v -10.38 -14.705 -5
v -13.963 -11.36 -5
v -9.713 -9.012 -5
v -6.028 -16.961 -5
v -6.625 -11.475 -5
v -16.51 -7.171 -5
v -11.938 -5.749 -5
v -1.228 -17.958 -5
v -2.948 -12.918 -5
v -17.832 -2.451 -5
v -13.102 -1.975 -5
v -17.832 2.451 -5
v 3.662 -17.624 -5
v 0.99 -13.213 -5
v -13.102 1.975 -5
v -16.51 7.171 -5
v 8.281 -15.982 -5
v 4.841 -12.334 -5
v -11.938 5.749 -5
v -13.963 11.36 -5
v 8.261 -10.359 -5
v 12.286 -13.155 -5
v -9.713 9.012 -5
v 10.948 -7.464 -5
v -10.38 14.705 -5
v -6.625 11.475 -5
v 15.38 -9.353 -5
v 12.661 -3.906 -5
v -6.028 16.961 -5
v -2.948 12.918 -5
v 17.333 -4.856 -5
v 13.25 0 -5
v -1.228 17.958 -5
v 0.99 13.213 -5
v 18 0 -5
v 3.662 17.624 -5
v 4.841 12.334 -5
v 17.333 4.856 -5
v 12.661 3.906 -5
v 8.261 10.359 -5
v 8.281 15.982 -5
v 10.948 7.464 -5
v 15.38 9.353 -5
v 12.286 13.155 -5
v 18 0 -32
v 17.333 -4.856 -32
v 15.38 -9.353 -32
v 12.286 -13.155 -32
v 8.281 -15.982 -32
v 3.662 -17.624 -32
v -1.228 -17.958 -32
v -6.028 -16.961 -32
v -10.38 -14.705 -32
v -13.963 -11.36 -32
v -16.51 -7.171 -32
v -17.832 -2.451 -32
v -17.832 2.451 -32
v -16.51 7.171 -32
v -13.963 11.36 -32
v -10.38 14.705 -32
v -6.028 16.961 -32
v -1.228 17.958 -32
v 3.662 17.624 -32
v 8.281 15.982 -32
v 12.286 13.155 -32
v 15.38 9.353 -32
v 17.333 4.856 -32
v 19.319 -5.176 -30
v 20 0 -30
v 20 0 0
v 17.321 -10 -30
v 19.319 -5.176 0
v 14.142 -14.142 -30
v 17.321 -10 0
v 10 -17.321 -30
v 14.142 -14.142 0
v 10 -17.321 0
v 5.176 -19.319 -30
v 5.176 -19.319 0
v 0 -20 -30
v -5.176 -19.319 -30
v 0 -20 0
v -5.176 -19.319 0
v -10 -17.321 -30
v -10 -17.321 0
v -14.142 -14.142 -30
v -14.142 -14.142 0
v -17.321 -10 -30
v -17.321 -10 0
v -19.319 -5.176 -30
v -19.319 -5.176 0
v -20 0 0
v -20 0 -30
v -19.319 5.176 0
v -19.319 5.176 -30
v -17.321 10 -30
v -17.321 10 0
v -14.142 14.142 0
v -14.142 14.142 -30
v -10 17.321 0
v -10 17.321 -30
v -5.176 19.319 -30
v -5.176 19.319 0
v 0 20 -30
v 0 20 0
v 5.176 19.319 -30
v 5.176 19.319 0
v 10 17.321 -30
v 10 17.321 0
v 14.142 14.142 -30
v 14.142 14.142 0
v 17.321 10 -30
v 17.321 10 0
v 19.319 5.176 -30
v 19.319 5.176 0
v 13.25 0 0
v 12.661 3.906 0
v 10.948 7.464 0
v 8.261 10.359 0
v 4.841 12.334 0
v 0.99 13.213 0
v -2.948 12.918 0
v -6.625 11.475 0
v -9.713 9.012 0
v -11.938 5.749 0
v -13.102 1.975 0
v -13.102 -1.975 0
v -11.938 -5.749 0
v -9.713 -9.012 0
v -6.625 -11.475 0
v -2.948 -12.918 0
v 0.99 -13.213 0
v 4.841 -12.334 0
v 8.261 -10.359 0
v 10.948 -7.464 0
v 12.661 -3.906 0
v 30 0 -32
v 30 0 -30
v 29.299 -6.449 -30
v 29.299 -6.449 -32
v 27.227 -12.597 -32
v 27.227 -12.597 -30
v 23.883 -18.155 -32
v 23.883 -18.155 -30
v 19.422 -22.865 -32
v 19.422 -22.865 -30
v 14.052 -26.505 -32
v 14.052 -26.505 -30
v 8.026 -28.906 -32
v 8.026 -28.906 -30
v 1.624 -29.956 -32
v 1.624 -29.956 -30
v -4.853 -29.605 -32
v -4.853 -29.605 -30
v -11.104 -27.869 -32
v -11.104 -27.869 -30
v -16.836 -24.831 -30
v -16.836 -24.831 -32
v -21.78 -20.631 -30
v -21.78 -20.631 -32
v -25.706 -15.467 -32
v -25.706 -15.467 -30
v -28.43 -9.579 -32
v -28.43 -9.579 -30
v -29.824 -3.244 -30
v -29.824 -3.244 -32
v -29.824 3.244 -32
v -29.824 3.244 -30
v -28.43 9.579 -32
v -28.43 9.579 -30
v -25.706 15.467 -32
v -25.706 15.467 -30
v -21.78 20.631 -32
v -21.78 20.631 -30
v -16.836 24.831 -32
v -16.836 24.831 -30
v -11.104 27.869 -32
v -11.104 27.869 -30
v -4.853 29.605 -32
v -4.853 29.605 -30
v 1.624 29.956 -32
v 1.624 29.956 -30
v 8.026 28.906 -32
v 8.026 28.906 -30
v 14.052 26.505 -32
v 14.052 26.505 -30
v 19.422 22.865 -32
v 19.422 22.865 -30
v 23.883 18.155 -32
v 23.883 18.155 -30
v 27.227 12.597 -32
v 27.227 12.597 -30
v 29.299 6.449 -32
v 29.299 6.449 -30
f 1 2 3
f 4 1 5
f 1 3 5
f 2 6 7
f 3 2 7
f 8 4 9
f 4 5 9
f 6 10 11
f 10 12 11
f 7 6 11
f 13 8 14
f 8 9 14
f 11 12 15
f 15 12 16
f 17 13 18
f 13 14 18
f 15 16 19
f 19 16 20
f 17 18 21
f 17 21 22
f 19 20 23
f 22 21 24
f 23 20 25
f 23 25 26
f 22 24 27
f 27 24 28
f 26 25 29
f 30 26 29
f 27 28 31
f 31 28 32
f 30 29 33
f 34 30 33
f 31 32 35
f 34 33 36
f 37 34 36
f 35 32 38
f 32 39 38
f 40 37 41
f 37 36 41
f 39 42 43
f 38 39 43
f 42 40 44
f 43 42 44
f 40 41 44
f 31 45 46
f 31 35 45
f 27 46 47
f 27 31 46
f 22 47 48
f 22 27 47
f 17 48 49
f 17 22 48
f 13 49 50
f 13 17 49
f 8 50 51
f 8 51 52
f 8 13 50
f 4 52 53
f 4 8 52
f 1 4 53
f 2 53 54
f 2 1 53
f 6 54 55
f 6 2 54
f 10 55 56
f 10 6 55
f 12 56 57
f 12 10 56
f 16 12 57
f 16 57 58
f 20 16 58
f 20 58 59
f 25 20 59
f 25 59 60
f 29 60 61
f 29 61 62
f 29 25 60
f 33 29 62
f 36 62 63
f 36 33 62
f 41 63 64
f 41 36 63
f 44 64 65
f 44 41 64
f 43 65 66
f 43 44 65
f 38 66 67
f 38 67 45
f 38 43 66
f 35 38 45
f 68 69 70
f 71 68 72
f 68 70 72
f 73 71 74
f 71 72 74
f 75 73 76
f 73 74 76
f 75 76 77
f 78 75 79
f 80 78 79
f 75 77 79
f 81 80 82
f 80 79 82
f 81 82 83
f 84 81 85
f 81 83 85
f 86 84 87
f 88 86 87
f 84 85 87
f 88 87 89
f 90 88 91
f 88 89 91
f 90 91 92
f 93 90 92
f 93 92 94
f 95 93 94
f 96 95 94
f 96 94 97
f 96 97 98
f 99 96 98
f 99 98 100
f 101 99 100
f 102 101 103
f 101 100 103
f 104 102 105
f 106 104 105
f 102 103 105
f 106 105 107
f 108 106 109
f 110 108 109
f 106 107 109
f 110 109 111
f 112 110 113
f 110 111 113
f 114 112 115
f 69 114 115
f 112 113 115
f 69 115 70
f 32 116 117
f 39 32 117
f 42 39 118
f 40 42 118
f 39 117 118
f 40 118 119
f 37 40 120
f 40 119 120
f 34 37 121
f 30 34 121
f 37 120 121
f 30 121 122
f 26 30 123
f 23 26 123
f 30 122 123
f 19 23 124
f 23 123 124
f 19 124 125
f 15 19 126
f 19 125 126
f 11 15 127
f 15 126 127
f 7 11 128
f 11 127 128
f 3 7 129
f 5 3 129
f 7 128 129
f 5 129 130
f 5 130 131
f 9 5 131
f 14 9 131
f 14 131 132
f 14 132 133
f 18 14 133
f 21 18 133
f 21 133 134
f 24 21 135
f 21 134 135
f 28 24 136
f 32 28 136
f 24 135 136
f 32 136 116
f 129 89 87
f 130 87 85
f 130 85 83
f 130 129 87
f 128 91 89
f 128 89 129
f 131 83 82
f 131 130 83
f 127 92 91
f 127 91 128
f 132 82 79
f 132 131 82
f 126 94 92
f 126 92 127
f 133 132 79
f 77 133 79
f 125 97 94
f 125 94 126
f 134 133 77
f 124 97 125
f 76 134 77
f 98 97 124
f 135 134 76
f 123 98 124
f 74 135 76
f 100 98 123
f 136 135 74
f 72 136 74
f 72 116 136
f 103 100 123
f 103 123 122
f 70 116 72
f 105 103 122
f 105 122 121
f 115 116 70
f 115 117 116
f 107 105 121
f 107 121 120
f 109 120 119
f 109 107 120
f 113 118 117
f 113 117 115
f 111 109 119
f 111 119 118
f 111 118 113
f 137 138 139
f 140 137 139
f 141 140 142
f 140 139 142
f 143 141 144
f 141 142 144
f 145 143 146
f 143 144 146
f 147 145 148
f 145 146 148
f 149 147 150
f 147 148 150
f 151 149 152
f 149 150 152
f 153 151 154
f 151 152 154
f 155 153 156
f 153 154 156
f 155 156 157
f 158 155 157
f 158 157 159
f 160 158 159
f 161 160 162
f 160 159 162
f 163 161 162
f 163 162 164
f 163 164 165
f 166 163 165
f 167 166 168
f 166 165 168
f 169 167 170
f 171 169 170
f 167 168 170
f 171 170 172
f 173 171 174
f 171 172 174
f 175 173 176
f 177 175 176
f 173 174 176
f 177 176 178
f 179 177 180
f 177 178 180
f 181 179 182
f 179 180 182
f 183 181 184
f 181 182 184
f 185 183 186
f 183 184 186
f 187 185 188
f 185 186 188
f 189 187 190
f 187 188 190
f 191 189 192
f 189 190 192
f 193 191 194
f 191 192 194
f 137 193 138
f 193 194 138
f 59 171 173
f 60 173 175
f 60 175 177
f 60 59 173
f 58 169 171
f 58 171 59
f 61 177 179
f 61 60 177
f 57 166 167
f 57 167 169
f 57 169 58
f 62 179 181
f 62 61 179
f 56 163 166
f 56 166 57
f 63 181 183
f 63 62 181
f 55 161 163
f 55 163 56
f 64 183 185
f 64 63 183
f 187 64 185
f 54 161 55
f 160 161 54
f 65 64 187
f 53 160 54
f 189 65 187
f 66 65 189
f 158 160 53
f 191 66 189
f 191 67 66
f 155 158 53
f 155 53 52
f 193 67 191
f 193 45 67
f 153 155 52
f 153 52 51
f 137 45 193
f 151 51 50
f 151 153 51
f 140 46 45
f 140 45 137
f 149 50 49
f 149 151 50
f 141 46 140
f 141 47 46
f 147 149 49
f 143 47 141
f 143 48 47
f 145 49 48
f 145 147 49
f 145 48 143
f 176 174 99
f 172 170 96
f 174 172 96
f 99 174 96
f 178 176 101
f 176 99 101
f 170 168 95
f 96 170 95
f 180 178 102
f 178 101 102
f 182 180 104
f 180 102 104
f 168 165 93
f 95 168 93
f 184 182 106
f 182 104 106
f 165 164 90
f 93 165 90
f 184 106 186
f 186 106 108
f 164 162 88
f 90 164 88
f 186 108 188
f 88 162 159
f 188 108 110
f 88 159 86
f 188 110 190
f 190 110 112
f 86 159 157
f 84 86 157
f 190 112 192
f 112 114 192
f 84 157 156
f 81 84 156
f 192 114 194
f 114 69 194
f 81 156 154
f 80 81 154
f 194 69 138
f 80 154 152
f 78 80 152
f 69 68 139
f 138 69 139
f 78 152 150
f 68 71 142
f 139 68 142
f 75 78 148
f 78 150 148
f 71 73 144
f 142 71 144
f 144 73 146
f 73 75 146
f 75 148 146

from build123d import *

# Parameters (mm, degrees)
F0_R     = 20
F0_R_2   = 13.25
F1_DEPTH = 5
F2_R     = 20
F2_R_2   = 18
F3_DEPTH = 25
F4_R     = 30
F4_R_2   = 18
F5_DEPTH = 2


with BuildPart() as f1:
    # F0 (on Top) → F1 (new body)
    with BuildSketch(Plane.XY):
        Circle(F0_R)
        Circle(F0_R_2, mode=Mode.SUBTRACT)
    extrude(amount=-F1_DEPTH)

    # F2 (on face) → F3 (join)
    with BuildSketch(Plane(origin=(0, 0, -5), x_dir=(1, 0, 0), z_dir=(0, 0, -1))):
        Circle(F2_R)
        Circle(F2_R_2, mode=Mode.SUBTRACT)
    extrude(amount=F3_DEPTH)

    # F4 (on face) → F5 (join)
    with BuildSketch(Plane(origin=(0, 0, -30), x_dir=(1, 0, 0), z_dir=(0, 0, -1))):
        Circle(F4_R)
        Circle(F4_R_2, mode=Mode.SUBTRACT)
    extrude(amount=F5_DEPTH)


solid = f1.part
